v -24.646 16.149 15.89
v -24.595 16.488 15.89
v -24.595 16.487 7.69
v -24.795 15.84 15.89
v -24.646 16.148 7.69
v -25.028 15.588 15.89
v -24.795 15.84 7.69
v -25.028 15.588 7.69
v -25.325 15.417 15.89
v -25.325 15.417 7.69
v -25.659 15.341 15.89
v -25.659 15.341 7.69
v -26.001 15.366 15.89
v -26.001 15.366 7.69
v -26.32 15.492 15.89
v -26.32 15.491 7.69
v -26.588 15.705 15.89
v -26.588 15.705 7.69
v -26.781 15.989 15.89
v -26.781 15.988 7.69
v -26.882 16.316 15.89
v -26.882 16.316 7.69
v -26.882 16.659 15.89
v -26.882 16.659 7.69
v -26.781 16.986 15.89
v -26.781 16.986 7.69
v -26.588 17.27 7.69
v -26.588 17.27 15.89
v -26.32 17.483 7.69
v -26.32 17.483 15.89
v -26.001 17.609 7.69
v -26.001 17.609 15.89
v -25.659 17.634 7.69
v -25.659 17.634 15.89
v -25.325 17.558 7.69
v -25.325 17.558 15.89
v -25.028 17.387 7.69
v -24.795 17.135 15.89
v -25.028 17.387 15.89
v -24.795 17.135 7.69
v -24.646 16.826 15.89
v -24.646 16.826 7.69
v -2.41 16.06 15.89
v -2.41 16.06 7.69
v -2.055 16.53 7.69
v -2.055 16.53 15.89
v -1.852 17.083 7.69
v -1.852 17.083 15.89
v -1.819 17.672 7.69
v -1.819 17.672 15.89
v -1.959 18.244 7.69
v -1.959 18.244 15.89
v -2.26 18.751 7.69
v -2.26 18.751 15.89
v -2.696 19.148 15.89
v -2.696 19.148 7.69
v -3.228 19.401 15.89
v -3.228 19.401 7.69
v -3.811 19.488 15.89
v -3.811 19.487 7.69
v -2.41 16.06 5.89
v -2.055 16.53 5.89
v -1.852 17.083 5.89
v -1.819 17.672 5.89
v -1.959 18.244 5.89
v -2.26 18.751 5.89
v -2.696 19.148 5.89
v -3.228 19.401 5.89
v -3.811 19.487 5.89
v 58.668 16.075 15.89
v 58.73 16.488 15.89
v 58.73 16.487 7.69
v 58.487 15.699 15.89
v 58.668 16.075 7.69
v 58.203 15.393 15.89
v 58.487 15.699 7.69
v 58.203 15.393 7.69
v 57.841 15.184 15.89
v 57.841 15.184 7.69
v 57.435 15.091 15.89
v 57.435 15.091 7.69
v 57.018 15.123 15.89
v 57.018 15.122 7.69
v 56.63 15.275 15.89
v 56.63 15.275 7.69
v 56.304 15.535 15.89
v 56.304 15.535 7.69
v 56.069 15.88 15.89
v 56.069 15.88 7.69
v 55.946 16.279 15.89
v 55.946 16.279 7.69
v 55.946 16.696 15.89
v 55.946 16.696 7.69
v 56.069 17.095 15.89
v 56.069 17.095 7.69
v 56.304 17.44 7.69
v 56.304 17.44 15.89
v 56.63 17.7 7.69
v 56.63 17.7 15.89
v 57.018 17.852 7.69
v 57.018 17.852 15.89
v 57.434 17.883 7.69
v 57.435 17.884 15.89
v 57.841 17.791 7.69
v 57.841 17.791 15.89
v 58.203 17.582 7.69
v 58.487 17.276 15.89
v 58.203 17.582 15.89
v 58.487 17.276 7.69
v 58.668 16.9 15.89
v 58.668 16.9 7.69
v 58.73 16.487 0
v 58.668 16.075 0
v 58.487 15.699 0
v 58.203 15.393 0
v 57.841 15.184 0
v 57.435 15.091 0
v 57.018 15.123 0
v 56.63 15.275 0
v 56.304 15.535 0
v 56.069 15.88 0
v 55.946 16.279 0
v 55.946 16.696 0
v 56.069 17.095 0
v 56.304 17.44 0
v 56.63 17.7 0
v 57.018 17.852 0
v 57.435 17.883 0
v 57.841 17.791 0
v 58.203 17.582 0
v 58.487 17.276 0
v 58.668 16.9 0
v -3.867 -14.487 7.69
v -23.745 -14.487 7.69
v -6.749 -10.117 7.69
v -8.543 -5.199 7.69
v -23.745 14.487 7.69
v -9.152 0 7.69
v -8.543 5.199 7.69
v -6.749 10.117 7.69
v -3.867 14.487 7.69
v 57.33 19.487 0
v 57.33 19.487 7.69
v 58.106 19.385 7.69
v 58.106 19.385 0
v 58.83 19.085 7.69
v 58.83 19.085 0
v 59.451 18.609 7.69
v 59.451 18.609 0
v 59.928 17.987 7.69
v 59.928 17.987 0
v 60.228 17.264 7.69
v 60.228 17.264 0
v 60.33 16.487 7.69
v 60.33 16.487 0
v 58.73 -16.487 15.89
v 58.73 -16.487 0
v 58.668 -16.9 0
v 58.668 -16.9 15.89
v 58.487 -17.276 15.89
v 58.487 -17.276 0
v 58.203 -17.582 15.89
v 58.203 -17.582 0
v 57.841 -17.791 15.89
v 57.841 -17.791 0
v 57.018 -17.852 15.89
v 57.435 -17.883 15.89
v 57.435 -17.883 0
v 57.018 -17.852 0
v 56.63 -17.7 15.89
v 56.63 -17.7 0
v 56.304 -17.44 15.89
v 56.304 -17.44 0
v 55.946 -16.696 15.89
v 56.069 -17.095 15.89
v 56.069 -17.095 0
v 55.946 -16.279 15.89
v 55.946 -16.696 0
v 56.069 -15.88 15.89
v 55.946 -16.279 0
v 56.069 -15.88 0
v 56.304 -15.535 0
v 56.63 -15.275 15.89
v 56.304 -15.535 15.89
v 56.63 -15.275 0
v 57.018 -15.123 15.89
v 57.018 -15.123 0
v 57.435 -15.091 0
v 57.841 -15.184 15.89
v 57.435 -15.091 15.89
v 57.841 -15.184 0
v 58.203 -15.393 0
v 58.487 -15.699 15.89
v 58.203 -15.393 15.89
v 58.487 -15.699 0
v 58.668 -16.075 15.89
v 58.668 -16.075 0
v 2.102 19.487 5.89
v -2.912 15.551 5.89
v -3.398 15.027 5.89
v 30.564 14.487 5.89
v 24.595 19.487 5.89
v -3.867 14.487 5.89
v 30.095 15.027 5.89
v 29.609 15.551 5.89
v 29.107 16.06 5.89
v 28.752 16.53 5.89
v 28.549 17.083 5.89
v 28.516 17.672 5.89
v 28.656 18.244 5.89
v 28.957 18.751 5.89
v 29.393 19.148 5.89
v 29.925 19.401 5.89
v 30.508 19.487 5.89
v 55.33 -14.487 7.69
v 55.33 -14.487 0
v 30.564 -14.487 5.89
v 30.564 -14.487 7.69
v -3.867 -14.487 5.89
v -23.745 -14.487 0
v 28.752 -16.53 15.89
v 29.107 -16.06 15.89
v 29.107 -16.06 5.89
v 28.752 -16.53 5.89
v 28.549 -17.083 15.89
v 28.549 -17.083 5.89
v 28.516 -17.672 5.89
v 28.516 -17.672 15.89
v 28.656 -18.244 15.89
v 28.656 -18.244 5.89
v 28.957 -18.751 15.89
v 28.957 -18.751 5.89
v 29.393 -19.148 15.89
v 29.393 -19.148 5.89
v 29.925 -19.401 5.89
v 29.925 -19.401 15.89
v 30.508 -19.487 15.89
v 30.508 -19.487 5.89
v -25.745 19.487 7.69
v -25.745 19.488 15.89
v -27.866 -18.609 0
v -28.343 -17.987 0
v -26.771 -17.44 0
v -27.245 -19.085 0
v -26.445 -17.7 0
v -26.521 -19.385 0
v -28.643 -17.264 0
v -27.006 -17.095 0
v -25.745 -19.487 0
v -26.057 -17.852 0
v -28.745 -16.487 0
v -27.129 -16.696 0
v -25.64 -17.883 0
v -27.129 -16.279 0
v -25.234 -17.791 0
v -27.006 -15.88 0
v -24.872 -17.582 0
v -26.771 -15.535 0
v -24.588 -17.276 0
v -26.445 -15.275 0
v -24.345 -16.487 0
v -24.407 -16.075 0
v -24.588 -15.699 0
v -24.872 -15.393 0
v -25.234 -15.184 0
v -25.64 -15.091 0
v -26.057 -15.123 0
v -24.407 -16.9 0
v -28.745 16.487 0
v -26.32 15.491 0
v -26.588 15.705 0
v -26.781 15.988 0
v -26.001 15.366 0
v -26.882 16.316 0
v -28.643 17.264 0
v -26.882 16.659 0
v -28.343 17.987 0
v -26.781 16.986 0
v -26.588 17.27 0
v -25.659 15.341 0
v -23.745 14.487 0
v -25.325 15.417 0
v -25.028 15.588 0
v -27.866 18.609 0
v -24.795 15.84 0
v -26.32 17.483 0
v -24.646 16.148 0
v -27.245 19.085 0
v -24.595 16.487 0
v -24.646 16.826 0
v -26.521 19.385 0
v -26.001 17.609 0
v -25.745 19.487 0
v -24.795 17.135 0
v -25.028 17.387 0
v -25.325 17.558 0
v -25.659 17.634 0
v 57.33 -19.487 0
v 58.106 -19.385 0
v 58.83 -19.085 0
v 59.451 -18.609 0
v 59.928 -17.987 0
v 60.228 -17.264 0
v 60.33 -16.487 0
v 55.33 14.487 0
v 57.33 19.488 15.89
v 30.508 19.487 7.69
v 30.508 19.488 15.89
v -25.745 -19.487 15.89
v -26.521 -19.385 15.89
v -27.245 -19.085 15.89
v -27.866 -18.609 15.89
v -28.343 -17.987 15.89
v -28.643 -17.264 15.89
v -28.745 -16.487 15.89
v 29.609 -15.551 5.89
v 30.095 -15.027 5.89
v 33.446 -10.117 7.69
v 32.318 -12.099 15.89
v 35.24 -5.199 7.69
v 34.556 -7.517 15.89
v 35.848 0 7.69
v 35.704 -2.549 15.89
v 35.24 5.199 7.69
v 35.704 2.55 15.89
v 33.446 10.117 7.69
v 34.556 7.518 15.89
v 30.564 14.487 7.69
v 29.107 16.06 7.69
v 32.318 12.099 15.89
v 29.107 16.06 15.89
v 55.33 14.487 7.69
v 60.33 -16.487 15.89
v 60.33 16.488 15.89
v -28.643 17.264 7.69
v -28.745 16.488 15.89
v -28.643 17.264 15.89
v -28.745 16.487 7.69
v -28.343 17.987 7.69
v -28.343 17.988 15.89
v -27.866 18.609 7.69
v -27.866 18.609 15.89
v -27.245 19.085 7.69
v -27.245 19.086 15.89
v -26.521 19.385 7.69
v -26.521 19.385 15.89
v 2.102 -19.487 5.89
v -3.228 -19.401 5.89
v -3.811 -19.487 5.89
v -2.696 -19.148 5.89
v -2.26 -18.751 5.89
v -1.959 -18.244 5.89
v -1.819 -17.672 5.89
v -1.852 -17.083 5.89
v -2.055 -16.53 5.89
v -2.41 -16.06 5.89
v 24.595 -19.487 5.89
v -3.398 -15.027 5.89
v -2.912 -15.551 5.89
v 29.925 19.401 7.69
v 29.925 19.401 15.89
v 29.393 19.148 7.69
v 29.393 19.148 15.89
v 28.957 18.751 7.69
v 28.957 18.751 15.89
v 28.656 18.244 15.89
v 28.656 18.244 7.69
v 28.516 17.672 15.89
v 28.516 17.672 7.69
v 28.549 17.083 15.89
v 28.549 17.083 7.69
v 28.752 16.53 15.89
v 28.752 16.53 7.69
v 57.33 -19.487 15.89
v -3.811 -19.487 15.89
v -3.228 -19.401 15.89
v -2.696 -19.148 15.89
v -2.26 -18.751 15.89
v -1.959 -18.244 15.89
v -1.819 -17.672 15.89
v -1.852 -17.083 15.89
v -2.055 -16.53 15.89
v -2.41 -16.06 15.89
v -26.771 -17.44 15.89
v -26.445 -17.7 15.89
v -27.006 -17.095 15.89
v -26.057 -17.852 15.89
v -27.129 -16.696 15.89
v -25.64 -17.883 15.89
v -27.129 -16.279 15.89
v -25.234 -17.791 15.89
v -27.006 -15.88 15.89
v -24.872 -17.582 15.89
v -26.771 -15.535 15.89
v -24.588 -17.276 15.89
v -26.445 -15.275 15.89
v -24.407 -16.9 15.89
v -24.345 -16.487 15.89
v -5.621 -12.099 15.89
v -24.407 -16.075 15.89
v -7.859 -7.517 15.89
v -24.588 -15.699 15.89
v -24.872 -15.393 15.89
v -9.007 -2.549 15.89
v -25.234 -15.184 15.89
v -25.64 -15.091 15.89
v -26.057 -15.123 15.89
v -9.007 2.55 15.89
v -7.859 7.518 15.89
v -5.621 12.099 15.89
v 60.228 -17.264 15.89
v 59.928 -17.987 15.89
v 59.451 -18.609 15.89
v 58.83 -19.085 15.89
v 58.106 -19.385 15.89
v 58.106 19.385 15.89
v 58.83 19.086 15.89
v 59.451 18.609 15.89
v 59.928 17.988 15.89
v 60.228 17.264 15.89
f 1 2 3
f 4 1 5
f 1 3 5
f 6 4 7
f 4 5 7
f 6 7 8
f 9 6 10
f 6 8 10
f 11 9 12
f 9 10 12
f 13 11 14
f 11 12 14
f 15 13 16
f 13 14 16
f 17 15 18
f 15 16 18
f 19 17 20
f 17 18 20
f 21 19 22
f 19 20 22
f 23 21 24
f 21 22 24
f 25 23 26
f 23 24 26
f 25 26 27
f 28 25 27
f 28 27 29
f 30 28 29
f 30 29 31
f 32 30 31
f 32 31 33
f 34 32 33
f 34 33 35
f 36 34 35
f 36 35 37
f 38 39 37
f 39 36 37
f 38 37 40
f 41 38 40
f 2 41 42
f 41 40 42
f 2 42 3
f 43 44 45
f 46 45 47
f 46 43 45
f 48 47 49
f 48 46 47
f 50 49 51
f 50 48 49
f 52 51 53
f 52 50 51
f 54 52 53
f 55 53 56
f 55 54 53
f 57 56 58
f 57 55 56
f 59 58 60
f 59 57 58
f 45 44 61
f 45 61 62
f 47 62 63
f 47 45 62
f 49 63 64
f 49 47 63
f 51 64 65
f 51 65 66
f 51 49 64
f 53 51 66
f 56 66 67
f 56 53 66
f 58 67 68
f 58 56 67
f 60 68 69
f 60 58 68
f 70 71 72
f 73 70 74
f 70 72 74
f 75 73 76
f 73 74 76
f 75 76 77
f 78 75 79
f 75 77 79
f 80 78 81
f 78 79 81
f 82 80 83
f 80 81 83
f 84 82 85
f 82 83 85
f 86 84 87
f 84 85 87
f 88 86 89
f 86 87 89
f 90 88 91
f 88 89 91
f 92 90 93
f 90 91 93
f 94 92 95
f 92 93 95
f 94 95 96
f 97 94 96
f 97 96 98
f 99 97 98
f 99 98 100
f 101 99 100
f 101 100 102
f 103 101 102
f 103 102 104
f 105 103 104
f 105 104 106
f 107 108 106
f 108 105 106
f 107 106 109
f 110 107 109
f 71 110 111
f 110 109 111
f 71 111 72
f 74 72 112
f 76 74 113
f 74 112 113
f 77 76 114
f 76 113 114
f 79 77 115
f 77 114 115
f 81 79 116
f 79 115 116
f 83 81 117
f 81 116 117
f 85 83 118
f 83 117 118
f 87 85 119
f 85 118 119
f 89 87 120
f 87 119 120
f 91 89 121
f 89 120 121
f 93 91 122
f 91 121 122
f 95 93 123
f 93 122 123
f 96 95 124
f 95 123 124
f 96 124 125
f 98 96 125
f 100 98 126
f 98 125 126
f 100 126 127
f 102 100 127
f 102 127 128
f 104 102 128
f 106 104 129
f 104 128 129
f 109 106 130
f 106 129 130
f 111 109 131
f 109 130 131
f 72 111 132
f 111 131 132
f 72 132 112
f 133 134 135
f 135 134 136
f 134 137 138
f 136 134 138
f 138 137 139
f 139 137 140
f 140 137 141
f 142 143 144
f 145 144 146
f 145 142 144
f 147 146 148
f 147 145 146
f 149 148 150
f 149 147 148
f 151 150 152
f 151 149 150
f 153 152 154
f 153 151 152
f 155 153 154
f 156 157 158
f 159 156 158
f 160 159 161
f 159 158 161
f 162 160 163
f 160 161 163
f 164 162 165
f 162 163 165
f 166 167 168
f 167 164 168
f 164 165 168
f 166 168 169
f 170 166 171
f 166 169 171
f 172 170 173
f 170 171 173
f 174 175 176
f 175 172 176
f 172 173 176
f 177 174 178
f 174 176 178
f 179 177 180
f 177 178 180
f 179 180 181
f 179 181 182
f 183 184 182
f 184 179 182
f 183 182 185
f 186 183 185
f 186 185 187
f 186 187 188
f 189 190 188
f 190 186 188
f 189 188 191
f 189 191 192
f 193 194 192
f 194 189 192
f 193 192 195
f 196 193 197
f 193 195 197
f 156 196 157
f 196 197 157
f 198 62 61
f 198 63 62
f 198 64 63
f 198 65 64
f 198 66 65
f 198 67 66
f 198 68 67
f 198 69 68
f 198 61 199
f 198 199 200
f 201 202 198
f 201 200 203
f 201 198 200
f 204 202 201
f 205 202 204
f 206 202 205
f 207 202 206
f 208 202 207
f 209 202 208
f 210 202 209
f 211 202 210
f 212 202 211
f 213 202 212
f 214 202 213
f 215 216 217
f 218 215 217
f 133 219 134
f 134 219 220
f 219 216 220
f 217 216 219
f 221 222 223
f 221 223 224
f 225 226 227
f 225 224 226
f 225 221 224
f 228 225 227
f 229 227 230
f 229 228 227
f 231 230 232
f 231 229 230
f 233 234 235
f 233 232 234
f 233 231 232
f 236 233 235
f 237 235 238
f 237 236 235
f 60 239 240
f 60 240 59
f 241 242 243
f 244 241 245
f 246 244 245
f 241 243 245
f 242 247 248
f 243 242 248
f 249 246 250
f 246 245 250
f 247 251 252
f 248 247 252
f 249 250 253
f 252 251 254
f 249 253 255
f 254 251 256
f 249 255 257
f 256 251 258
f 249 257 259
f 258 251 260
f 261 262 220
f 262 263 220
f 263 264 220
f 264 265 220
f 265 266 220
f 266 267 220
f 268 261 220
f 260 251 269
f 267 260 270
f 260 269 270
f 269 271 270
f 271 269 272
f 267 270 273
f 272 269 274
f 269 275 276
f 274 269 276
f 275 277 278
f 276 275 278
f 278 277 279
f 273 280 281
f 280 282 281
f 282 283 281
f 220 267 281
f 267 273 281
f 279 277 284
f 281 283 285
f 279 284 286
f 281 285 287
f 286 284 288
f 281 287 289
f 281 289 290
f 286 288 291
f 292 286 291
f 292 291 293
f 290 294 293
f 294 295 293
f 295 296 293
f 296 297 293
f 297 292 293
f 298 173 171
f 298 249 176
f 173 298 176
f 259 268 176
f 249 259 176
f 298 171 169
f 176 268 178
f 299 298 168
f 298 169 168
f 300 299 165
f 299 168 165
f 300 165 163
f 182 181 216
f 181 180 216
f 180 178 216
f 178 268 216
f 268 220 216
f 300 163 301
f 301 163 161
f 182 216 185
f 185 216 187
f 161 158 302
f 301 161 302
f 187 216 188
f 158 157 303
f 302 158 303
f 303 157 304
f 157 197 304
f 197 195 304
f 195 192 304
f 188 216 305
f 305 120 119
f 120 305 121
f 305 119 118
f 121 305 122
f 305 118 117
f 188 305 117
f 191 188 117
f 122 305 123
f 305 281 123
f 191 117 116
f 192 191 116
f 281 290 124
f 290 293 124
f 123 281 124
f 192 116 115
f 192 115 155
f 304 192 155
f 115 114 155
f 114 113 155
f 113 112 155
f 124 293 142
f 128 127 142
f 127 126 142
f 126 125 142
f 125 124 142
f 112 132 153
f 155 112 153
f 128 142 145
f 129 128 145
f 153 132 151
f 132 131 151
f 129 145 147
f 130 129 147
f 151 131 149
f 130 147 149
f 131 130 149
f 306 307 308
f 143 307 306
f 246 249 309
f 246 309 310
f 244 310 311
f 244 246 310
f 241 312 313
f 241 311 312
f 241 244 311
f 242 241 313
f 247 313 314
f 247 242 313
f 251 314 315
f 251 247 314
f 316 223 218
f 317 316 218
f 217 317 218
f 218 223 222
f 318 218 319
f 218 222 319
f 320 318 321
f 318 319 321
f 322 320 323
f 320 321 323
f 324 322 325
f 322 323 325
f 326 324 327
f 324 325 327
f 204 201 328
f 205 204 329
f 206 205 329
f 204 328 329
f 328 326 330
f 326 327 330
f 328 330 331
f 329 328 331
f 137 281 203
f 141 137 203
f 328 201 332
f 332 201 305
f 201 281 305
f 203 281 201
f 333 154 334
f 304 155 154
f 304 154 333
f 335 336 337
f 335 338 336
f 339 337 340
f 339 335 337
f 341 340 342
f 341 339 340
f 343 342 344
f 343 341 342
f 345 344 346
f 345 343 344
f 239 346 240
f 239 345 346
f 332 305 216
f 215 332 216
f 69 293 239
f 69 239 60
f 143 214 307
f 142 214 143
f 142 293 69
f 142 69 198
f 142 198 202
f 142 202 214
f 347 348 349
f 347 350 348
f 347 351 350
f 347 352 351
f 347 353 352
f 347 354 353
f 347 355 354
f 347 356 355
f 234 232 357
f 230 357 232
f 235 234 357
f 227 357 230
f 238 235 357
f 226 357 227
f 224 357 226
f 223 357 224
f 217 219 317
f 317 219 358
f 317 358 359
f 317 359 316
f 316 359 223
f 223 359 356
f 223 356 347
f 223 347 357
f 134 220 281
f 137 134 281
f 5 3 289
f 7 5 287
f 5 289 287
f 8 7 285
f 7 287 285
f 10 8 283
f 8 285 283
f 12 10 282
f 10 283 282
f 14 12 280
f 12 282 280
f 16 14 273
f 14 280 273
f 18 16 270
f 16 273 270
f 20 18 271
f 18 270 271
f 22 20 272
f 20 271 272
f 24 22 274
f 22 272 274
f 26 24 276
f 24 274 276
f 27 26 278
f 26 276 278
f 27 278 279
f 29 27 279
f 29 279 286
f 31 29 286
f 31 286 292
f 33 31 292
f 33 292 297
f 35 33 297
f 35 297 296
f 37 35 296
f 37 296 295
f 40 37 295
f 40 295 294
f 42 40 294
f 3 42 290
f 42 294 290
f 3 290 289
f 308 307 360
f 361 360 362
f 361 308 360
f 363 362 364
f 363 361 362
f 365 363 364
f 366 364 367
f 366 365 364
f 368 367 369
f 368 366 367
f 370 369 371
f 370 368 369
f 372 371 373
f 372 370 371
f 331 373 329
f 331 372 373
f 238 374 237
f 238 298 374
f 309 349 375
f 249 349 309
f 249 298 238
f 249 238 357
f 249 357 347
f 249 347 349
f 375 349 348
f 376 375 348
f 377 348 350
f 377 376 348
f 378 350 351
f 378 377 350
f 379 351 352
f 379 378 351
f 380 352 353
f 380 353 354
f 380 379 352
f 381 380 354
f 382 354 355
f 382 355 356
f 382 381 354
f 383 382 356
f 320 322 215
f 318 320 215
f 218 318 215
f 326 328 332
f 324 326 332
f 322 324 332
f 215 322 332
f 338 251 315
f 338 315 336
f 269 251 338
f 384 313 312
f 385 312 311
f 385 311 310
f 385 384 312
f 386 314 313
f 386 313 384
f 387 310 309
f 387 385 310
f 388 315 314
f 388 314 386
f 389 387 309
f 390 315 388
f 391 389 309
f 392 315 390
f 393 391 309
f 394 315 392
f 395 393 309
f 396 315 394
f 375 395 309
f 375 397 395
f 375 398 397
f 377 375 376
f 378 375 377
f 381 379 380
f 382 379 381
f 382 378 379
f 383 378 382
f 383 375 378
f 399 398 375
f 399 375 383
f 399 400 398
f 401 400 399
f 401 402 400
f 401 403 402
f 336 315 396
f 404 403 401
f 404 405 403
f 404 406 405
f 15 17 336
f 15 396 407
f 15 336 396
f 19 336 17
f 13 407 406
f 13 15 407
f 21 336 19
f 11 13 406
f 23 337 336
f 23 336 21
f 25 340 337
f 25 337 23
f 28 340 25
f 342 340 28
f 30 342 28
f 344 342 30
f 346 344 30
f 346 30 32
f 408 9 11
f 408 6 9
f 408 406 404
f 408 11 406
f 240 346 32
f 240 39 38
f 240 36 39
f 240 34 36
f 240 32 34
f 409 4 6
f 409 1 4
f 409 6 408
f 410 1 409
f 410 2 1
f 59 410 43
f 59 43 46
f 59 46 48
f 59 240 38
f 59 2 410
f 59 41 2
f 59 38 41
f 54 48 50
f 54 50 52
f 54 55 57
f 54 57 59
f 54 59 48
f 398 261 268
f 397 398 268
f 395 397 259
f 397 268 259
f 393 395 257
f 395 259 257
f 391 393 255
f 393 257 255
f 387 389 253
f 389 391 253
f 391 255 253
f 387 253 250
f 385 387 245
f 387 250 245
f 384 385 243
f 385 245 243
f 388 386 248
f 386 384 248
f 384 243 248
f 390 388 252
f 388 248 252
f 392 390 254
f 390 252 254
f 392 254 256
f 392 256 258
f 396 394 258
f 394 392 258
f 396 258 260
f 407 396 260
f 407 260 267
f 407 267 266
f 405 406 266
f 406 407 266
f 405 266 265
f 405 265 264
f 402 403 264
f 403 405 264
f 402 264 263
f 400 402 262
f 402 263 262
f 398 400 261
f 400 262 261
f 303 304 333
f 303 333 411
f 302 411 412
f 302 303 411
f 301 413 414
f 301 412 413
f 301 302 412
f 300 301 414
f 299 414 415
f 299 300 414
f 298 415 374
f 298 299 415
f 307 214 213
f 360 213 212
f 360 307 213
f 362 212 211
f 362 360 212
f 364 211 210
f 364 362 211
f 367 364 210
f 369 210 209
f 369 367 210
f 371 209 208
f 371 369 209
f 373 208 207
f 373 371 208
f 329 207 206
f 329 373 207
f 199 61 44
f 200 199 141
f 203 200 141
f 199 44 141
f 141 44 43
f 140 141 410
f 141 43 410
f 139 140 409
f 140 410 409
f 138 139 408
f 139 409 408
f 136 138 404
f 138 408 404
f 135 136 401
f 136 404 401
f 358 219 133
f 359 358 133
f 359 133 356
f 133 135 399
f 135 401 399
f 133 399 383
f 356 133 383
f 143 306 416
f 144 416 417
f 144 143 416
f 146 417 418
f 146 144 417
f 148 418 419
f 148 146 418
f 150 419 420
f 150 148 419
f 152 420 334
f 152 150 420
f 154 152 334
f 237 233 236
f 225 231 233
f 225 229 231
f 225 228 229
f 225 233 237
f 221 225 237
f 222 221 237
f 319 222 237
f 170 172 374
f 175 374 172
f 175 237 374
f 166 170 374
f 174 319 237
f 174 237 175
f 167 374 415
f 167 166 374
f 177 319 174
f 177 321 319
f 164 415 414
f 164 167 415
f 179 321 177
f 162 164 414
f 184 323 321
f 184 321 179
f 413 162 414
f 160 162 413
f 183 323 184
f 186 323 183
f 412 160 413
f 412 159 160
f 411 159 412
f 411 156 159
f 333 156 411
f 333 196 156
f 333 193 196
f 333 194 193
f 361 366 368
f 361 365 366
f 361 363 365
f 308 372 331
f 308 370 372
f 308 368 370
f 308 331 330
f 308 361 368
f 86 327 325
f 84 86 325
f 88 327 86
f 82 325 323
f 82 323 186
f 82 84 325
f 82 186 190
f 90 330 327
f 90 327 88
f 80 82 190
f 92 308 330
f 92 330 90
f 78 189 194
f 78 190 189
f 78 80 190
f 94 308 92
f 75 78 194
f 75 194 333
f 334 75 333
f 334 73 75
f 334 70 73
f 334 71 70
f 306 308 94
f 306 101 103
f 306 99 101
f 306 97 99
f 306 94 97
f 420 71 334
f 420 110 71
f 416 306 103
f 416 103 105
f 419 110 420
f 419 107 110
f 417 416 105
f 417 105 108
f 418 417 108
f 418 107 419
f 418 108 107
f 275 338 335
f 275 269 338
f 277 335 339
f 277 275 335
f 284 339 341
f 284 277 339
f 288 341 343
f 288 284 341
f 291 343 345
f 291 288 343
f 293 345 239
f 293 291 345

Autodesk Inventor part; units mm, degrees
ref_plane "YZ Plane" through (0, 0, 0) normal (1, 0, 0) x (0, 1, 0)
ref_plane "Arbeitsebene1" through (0, 0, 0) normal (0, 0, 1) x (1, 0, 0)
sketch "Skizze1" plane through (0, 0, 0) normal (0, 0, 1) x (1, 0, 0)
  circle A0 centre (57.3299, 16.4874) radius 1.4 projected
  circle A1 centre (-25.745, -16.4874) radius 1.4 projected
  circle A2 centre (57.3299, -16.4874) radius 1.4 projected
  circle A3 centre (-25.745, 16.4874) radius 1.15 projected
  circle A4 centre (9.875, 11.6896) radius 0.65 projected
  circle A5 centre (9.875, -11.3104) radius 0.65 projected
  circle A6 centre (14.955, 11.6896) radius 0.65 projected
  circle A7 centre (14.955, -11.3104) radius 0.65 projected
  circle A8 centre (25.115, 11.6896) radius 0.65 projected
  circle A9 centre (25.115, -11.3104) radius 0.65 projected
  circle A10 centre (30.195, 11.6896) radius 0.65 projected
  circle A11 centre (30.195, -11.3104) radius 0.65 projected
  circle A12 centre (-2.825, -11.3104) radius 0.65 projected
  circle A13 centre (-2.825, 11.6896) radius 0.65 projected
  circle A14 centre (-0.285, -11.3104) radius 0.65 projected
  circle A15 centre (-0.285, 11.6896) radius 0.65 projected
  circle A16 centre (2.255, -11.3104) radius 0.65 projected
  circle A17 centre (2.255, 11.6896) radius 0.65 projected
  circle A18 centre (4.795, -11.3104) radius 0.65 projected
  circle A19 centre (4.795, 11.6896) radius 0.65 projected
  circle A20 centre (27.655, -11.3104) radius 0.65 projected
  circle A21 centre (27.655, 11.6896) radius 0.65 projected
  circle A22 centre (22.575, -11.3104) radius 0.65 projected
  circle A23 centre (22.575, 11.6896) radius 0.65 projected
  circle A24 centre (17.495, -11.3104) radius 0.65 projected
  circle A25 centre (17.495, 11.6896) radius 0.65 projected
  circle A26 centre (12.415, -11.3104) radius 0.65 projected
  circle A27 centre (12.415, 11.6896) radius 0.65 projected
  circle A28 centre (7.335, -11.3104) radius 0.65 projected
  circle A29 centre (7.335, 11.6896) radius 0.65 projected
  circle A30 centre (20.035, 11.6896) radius 0.65 projected
  circle A31 centre (20.035, -11.3104) radius 0.65 projected
  arc A32 (-28.745, -16.4874) -> (-25.745, -19.4874) centre (-25.745, -16.4874) ccw projected
  line L0 (57.3299, -19.4874) -> (-25.745, -19.4874) projected
  arc A33 (57.3299, -19.4874) -> (60.3299, -16.4874) centre (57.3299, -16.4874) ccw projected
  line L1 (60.3299, 16.4874) -> (60.3299, -16.4874) projected
  arc A34 (60.3299, 16.4874) -> (57.3299, 19.4874) centre (57.3299, 16.4874) ccw projected
  line L2 (-25.745, 19.4874) -> (57.3299, 19.4874) projected
  arc A35 (-25.745, 19.4874) -> (-28.745, 16.4874) centre (-25.745, 16.4874) ccw projected
  line L3 (-28.745, -16.4874) -> (-28.745, 16.4874) projected
  line L4 (55.3299, 14.4874) -> (55.3299, -14.4874)
  line L5 (55.3299, -14.4874) -> (-23.745, -14.4874)
  line L6 (-23.745, -14.4874) -> (-23.745, 14.4874)
  line L7 (-23.745, 14.4874) -> (55.3299, 14.4874)
  point P0 (0, 0)
  dimension "d0" = 5
ref_plane "Arbeitsebene2" through (-3.9015, -6.25, 7.6898) normal (0, 0, 1) x (1, 0, 0)
extrude "Extrusion1" add sketch "Skizze1" along normal up to surface (7.6898 mm away) contours L3 A35 L2 A34 L1 A33 L0 A32
sketch "Skizze2" plane through (-25.745, -19.4874, 7.6898) normal (0, 0, 1) x (1, 0, 0)
  circle A0 centre (83.0749, 35.9749) radius 1.4 projected
  circle A1 centre (0, 3) radius 1.4 projected
  circle A2 centre (83.0749, 3) radius 1.4 projected
  circle A3 centre (0, 35.9749) radius 1.15 projected
  line L0 (81.0749, 33.9749) -> (2, 33.9749) projected
  line L1 (81.0749, 5) -> (81.0749, 33.9749) projected
  line L2 (2, 5) -> (81.0749, 5) projected
  line L3 (2, 33.9749) -> (2, 5) projected
  arc A4 (0, 38.9749) -> (-3, 35.9749) centre (0, 35.9749) ccw projected
  line L4 (-3, 3) -> (-3, 35.9749) projected
  arc A5 (-3, 3) -> (0, 0) centre (0, 3) ccw projected
  line L5 (83.0749, 0) -> (0, 0) projected
  arc A6 (83.0749, 0) -> (86.0749, 3) centre (83.0749, 3) ccw projected
  line L6 (86.0749, 35.9749) -> (86.0749, 3) projected
  arc A7 (86.0749, 35.9749) -> (83.0749, 38.9749) centre (83.0749, 35.9749) ccw projected
  line L7 (0, 38.9749) -> (83.0749, 38.9749) projected
  circle A8 centre (39.0935, 19.4874) radius 3.8655 projected
  line L8 (43.0093, 18.0044) -> (43.0093, 15.5716) projected
  line L9 (43.0093, 15.322) -> (35.1777, 15.322) projected
  line L10 (35.1777, 23.4033) -> (37.6105, 23.4033) projected
  line L11 (34.9281, 15.5716) -> (34.9281, 23.4033) projected
  line L12 (43.3435, 23.4874) -> (43.3435, 15.4874) projected
  line L13 (35.0935, 23.7374) -> (43.0935, 23.7374) projected
  line L14 (34.9281, 15.5716) -> (34.9281, 23.4033) projected
  line L15 (34.9935, 15.3874) -> (43.1935, 15.3874)
  line L16 (43.1935, 15.3874) -> (43.1935, 23.5874)
  line L17 (43.1935, 23.5874) -> (34.9935, 23.5874)
  line L18 (34.9935, 23.5874) -> (34.9935, 15.3874)
  line L19 (34.9935, 15.3874) -> (43.1935, 23.5874) construction
  line L20 (43.1935, 15.3874) -> (34.9935, 23.5874) construction
  point P0 (25.745, 19.4874)
  dimension "d3" = 8.2
  dimension "d4" = 8.2
extrude "Extrusion2" add sketch "Skizze2" along normal blind 2.2 contours L1 L2 L3 L0 | L7 A7 L6 A6 L5 A5 L4 A4
ref_plane "Arbeitsebene3" through (-21.9576, -12.7, 16.9028) normal (0, 0, -1) x (0, 1, 0)
sketch "Skizze3" plane through (-25.745, -19.4874, 9.8898) normal (0, 0, 1) x (1, 0, 0)
  line L0 (83.0749, 38.9749) -> (0, 38.9749) projected
  arc A0 (0, 38.9749) -> (-3, 35.9749) centre (0, 35.9749) ccw projected
  line L1 (-3, 35.9749) -> (-3, 3) projected
  arc A1 (-3, 3) -> (0, 0) centre (0, 3) ccw projected
  line L2 (0, 0) -> (83.0749, 0) projected
  arc A2 (83.0749, 0) -> (86.0749, 3) centre (83.0749, 3) ccw projected
  line L3 (86.0749, 3) -> (86.0749, 35.9749) projected
  arc A3 (86.0749, 35.9749) -> (83.0749, 38.9749) centre (83.0749, 35.9749) ccw projected
  line L4 (34.9935, 15.3874) -> (34.9935, 23.5874) projected
  line L5 (34.9935, 23.5874) -> (43.1935, 23.5874) projected
  line L6 (43.1935, 23.5874) -> (43.1935, 15.3874) projected
  line L7 (43.1935, 15.3874) -> (34.9935, 15.3874) projected
  circle A4 centre (0, 35.9749) radius 1.15 projected
  circle A5 centre (83.0749, 3) radius 1.4 projected
  circle A6 centre (0, 3) radius 1.4 projected
  circle A7 centre (83.0749, 35.9749) radius 1.4 projected
  circle A8 centre (39.0935, 19.4874) radius 3.6158 projected
  circle A9 centre (39.0935, 19.4874) radius 3.475
  point P0 (25.745, 19.4874)
  dimension "d7" = 6.95
extrude "Extrusion3" add sketch "Skizze3" along normal blind 6 contours A3 L3 A2 L2 A1 L1 A0 L0 | L4 L5 L6 L7
sketch "Skizze4" plane through (-25.745, 19.4874, 15.8898) normal (0, 0, 1) x (1, 0, 0)
  circle A0 centre (39.0935, -19.4874) radius 3.6158 projected
  circle A1 centre (39.0935, -19.4874) radius 22.5
  point P0 (25.745, -19.4874)
  dimension "d10" = 45
extrude "Extrusion4" cut sketch "Skizze4" against normal blind 10
ref_plane "Arbeitsebene4" through (-25.745, 0, 0) normal (0, -1, 0) x (1, 0, 0)
fillet "Rundung1" radius 2 4 edges at (2.1017, -19.4874, 10.8898) (24.5952, -19.4874, 10.8898) (2.1017, 19.4874, 10.8898) (24.5952, 19.4874, 10.8898)
thread "Gewinde1" size "M45x1" class "6H" standard "ANSI Metric M Profile" full length
properties part number "ESP32ParasiteMicroscope_middle_v0"
